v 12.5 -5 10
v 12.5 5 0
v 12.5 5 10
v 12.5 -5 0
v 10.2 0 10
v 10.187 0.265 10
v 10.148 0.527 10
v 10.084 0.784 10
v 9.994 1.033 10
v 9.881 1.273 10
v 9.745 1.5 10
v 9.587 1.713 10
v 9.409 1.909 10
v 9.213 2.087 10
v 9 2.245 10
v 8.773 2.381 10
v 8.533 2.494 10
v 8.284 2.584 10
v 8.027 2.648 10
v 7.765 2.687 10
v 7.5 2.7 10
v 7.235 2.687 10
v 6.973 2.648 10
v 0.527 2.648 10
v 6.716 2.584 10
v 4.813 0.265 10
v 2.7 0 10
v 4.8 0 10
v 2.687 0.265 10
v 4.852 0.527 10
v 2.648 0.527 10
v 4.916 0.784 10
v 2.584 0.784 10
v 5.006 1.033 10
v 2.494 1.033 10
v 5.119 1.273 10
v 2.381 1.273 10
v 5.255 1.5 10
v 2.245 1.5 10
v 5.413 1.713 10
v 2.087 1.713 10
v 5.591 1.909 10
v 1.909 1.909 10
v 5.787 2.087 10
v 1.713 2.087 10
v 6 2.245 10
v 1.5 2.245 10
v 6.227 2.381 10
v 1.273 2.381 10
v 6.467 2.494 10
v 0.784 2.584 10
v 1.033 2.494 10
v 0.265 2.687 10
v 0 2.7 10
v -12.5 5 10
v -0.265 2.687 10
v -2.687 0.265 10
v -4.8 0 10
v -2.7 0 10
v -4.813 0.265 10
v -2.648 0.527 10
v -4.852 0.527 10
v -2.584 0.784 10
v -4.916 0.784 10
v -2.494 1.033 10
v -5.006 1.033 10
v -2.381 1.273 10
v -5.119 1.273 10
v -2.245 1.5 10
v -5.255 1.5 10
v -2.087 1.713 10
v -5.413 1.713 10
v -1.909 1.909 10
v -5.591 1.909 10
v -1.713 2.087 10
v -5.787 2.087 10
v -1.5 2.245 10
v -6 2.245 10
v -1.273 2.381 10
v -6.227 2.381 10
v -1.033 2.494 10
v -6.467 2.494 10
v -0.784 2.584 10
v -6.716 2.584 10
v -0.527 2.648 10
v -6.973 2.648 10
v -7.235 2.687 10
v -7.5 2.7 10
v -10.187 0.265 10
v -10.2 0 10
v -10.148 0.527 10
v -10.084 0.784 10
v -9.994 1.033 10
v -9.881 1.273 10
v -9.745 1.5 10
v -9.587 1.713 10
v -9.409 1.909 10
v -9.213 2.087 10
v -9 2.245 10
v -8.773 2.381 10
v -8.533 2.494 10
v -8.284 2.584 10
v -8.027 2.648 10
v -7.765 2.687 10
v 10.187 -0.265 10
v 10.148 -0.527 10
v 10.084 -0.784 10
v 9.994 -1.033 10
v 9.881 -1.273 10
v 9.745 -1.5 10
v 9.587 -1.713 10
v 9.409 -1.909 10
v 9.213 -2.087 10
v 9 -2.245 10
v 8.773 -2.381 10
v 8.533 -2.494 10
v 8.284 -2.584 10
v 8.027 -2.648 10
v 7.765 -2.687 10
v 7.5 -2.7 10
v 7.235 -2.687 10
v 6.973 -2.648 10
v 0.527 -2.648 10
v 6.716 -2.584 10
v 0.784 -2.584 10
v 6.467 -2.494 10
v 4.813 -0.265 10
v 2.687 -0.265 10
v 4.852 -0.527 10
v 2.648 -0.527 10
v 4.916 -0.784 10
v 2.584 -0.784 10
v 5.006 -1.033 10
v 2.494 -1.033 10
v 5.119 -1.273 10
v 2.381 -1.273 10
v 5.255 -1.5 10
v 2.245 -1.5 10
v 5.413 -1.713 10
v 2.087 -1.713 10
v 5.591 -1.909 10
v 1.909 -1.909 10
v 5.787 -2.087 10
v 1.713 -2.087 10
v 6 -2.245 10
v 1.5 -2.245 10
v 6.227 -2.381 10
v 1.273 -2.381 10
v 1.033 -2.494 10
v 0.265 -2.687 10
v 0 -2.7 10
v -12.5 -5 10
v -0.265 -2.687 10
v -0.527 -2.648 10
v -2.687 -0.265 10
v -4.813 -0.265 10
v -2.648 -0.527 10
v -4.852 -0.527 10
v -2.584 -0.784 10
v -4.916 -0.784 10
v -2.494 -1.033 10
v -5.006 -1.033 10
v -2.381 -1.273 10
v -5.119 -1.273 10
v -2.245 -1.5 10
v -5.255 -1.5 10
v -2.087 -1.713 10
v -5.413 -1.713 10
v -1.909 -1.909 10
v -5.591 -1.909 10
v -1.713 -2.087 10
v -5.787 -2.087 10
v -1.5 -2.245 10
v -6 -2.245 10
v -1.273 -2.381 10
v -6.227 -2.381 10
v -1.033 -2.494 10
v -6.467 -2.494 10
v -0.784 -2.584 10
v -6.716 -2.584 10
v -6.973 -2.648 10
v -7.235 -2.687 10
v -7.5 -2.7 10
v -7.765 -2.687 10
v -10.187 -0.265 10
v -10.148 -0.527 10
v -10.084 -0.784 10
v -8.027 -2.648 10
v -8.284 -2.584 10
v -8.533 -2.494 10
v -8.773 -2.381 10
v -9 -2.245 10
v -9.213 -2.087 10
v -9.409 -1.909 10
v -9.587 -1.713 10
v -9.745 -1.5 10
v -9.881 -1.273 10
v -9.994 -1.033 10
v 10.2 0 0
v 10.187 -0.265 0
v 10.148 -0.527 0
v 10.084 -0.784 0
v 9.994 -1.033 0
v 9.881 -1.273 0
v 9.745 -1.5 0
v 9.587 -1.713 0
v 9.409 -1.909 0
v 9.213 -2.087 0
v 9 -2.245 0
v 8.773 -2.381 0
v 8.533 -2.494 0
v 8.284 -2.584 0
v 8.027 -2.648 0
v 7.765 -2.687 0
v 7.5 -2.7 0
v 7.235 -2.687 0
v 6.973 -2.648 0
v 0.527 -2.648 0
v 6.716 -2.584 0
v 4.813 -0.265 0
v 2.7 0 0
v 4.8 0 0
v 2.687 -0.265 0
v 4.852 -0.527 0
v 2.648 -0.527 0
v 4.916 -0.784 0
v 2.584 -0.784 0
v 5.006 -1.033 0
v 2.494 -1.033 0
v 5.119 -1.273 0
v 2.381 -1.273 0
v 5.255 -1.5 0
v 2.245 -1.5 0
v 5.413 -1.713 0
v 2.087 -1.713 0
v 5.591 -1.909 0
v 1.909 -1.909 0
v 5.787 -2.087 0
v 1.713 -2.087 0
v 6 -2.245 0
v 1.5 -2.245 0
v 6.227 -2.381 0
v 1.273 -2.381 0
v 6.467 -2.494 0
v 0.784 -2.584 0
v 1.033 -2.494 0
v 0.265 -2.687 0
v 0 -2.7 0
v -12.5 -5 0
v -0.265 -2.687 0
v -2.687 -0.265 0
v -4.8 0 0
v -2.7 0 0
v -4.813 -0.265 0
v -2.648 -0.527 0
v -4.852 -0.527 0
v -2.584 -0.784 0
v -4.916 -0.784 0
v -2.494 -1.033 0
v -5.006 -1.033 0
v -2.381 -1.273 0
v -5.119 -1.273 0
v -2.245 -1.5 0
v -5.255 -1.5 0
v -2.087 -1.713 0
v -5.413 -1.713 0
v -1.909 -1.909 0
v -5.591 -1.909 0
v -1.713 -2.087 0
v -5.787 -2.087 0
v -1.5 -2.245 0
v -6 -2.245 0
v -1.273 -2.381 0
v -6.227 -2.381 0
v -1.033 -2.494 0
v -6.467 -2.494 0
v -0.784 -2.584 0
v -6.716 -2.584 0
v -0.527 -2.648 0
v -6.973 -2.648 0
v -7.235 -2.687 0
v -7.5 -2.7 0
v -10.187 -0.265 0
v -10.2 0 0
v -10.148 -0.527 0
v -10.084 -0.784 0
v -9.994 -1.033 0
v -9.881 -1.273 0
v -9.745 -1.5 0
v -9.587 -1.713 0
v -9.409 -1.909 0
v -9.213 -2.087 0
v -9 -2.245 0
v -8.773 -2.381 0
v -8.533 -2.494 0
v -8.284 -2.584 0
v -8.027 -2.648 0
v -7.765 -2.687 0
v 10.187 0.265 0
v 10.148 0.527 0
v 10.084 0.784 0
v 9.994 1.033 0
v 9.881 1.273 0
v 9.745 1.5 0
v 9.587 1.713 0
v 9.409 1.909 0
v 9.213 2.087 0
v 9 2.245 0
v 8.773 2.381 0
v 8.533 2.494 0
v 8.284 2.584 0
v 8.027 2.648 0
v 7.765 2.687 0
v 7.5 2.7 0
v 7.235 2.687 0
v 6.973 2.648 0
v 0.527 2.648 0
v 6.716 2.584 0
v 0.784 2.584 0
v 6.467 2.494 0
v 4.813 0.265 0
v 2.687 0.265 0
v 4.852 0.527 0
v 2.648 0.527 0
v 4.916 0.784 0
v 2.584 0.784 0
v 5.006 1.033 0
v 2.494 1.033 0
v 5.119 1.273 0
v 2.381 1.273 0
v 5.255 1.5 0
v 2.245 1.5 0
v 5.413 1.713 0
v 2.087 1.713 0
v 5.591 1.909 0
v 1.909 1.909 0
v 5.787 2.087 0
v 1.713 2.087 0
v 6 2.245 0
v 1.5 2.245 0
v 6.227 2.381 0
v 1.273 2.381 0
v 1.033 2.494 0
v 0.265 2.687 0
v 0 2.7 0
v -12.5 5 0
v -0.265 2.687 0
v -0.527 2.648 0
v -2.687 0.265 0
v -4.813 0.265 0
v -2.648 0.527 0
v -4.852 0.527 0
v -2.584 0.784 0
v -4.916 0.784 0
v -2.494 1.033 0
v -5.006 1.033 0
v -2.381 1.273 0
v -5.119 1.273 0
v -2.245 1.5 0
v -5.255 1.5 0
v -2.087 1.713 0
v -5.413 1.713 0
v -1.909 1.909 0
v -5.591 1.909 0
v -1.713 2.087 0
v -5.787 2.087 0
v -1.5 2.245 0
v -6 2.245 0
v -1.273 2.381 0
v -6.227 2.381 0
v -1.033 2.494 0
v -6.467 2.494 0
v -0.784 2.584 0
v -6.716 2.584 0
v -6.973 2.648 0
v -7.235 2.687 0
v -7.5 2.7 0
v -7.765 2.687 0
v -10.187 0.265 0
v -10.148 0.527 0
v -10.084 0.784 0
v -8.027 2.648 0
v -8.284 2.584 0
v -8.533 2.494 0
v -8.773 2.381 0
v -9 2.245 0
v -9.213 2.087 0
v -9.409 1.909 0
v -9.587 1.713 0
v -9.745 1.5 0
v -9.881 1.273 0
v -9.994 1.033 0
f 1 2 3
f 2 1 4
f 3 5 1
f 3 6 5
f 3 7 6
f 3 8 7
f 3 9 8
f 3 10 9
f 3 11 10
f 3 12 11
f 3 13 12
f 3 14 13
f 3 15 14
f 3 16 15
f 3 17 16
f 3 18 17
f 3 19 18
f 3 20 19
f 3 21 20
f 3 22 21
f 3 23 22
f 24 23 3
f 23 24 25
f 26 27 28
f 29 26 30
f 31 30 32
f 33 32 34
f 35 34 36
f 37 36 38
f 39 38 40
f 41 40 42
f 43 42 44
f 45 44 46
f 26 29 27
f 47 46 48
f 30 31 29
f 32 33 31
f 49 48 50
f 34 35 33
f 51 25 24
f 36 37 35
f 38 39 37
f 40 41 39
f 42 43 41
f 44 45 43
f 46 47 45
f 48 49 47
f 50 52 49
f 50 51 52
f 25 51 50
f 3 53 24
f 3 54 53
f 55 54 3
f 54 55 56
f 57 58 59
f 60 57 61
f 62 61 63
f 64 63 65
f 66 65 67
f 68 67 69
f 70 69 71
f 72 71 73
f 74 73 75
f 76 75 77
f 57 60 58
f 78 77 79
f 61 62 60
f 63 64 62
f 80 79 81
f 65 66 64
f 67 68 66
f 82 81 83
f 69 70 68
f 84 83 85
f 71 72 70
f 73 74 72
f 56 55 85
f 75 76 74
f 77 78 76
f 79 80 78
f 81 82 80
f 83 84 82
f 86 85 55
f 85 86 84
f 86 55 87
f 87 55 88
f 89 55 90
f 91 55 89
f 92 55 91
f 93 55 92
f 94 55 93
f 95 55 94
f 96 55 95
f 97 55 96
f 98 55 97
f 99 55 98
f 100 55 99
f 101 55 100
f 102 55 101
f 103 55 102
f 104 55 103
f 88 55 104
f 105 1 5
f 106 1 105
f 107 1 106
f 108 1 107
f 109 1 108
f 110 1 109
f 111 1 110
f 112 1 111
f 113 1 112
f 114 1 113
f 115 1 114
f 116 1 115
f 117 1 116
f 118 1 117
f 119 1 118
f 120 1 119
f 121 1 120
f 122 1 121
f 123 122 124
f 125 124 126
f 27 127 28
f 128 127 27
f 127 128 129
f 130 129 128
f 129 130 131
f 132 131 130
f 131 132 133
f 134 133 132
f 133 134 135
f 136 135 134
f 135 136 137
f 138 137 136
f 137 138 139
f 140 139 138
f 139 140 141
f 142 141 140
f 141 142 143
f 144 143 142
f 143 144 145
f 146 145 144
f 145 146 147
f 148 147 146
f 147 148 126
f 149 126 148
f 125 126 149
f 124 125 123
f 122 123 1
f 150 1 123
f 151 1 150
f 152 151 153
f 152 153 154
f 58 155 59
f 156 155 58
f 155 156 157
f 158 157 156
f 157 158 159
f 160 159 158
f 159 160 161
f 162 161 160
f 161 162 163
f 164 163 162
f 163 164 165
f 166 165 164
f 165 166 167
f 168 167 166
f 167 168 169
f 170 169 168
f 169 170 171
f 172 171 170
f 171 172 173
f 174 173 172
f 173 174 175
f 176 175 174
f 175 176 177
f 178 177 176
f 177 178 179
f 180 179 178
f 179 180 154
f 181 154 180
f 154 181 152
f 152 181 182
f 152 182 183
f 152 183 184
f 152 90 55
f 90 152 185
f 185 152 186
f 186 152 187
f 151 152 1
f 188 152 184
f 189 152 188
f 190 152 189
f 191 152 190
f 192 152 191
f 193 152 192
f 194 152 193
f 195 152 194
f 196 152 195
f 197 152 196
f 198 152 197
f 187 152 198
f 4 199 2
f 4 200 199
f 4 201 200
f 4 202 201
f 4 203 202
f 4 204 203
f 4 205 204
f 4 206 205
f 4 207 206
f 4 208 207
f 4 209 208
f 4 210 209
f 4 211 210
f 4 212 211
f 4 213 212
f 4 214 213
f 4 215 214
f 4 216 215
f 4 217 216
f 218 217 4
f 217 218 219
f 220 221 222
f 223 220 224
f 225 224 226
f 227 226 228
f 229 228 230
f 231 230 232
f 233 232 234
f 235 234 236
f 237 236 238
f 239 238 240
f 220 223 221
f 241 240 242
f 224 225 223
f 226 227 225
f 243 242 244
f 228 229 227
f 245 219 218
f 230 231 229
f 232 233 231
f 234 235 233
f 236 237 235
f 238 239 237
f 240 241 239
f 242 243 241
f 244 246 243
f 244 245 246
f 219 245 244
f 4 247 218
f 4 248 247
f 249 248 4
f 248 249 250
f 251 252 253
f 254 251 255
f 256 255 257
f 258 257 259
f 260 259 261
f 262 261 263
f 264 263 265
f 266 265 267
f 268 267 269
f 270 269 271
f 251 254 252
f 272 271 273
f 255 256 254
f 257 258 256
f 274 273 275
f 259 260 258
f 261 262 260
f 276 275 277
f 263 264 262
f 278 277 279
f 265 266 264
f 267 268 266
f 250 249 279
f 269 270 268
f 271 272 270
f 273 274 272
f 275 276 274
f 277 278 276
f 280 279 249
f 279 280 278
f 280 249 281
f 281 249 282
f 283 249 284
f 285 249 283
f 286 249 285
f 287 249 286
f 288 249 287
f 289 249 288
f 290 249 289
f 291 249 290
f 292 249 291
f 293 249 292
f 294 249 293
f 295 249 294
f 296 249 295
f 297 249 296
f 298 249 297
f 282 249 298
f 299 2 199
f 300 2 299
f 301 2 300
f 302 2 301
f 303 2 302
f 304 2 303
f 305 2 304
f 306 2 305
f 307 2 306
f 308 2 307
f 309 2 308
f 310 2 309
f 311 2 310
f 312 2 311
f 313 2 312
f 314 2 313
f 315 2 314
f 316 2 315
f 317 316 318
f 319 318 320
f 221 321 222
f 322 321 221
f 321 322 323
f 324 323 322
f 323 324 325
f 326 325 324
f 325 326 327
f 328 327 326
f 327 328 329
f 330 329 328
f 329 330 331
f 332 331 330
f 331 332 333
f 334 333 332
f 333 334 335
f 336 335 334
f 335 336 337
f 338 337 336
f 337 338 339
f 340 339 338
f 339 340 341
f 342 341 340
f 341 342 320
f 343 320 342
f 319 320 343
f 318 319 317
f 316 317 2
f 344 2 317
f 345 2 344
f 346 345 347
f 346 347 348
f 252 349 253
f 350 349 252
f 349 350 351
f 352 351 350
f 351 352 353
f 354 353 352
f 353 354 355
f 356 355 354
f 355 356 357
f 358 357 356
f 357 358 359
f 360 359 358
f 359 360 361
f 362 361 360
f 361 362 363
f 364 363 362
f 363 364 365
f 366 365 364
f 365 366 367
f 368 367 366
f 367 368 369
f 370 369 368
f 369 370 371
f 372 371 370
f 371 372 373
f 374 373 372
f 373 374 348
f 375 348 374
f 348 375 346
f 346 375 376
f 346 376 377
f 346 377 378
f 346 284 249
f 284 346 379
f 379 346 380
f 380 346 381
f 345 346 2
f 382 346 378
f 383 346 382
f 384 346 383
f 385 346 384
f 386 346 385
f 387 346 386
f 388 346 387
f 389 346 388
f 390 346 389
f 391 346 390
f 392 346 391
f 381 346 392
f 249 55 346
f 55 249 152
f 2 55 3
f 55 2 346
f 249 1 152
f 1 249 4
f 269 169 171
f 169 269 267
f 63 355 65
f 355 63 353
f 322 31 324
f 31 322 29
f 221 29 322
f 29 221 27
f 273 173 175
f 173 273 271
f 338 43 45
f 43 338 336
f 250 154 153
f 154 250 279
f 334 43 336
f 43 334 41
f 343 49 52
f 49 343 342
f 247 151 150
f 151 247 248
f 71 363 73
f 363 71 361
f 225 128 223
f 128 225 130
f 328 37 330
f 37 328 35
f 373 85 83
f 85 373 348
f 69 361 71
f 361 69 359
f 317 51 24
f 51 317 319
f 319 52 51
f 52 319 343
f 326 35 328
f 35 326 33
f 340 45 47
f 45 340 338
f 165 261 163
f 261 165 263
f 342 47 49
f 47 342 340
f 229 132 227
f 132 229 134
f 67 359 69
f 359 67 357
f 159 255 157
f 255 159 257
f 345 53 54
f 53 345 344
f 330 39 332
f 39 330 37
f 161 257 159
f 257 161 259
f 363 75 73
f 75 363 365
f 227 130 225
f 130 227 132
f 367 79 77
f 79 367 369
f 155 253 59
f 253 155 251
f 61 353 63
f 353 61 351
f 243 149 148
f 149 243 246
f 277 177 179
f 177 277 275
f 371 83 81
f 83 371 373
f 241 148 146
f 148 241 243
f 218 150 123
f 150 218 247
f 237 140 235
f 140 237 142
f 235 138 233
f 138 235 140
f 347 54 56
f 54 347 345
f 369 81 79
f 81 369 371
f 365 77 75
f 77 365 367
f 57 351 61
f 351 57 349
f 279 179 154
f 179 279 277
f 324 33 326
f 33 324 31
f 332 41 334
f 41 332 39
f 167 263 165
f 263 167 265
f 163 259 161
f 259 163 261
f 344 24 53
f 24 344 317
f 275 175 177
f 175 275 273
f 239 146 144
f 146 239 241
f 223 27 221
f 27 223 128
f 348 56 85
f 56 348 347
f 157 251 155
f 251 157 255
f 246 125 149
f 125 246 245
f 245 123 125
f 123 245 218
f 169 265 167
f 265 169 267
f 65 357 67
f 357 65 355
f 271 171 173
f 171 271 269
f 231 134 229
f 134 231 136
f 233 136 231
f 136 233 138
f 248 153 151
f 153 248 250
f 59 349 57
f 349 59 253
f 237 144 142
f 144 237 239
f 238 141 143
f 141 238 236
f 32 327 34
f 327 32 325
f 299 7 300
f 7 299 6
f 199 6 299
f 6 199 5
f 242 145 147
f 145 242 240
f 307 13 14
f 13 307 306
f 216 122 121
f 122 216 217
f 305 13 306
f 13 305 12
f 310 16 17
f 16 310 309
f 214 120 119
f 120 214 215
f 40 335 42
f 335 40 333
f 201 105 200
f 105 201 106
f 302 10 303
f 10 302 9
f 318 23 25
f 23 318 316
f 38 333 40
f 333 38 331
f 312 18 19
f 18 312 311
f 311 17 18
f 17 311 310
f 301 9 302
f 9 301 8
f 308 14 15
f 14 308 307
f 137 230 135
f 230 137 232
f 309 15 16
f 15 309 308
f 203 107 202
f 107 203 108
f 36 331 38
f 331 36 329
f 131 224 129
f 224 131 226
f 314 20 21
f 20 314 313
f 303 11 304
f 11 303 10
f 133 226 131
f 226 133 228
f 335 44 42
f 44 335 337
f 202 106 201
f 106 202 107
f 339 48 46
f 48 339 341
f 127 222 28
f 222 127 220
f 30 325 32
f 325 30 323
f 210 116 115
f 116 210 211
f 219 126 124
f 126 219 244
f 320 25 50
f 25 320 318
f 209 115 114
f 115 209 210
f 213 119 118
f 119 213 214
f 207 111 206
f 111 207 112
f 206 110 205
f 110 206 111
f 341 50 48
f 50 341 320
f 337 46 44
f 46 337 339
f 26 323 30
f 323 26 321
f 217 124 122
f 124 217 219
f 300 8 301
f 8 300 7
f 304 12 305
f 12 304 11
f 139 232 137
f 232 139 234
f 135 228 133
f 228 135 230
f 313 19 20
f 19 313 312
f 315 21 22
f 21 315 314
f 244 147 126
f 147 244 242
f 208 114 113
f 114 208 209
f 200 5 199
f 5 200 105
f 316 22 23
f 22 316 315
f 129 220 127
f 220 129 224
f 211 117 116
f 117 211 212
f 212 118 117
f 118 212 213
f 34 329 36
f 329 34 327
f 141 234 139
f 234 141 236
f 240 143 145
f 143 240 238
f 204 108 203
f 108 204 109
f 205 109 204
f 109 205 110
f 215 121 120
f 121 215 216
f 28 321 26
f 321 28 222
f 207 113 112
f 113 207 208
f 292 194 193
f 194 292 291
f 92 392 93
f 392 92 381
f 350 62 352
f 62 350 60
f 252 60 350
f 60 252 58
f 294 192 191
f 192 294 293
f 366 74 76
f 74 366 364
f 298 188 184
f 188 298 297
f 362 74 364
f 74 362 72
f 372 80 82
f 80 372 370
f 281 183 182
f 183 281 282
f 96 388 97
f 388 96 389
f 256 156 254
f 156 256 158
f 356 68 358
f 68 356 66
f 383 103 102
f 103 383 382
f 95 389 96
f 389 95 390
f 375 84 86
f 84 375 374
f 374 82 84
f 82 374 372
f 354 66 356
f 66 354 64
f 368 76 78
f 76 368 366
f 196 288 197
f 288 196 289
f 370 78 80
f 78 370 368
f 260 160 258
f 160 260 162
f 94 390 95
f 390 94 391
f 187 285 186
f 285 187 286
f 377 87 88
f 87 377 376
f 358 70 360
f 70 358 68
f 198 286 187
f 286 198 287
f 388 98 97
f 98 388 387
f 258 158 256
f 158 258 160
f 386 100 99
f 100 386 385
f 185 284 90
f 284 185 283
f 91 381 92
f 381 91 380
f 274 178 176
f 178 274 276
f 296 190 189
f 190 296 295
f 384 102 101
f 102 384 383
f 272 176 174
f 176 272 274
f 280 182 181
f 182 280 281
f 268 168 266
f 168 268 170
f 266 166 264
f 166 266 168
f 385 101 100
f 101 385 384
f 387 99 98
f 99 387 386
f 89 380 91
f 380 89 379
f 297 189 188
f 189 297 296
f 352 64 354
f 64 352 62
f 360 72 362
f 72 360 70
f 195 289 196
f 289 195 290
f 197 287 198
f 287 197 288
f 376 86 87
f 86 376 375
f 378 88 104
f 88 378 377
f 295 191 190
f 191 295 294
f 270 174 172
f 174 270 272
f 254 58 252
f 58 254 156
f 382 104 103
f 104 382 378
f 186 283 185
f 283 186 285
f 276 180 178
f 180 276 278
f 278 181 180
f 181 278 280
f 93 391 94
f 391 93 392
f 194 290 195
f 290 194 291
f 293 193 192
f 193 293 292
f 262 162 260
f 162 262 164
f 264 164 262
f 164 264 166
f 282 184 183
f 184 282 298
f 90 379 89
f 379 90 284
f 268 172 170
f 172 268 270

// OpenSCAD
DoubleLightSensor();

module DoubleLightSensor()
{
    union()
    {
        difference()
        {
            translate([0,0,5])
            cube([25, 10, 10], center=true);
            translate([0,0,-1])
            cylinder(d=5.4, h=12, $fn=64);
            translate([7.5,0,-1])
            cylinder(d=5.4, h=12, $fn=64);
            translate([-7.5,0,-1])
            cylinder(d=5.4, h=12, $fn=64);
        }
        //translate([17,0,25])
        //cube([10,10,50],center=true);
        //translate([-17,0,25])
        //cube([10,10,50],center=true);
    }
}
